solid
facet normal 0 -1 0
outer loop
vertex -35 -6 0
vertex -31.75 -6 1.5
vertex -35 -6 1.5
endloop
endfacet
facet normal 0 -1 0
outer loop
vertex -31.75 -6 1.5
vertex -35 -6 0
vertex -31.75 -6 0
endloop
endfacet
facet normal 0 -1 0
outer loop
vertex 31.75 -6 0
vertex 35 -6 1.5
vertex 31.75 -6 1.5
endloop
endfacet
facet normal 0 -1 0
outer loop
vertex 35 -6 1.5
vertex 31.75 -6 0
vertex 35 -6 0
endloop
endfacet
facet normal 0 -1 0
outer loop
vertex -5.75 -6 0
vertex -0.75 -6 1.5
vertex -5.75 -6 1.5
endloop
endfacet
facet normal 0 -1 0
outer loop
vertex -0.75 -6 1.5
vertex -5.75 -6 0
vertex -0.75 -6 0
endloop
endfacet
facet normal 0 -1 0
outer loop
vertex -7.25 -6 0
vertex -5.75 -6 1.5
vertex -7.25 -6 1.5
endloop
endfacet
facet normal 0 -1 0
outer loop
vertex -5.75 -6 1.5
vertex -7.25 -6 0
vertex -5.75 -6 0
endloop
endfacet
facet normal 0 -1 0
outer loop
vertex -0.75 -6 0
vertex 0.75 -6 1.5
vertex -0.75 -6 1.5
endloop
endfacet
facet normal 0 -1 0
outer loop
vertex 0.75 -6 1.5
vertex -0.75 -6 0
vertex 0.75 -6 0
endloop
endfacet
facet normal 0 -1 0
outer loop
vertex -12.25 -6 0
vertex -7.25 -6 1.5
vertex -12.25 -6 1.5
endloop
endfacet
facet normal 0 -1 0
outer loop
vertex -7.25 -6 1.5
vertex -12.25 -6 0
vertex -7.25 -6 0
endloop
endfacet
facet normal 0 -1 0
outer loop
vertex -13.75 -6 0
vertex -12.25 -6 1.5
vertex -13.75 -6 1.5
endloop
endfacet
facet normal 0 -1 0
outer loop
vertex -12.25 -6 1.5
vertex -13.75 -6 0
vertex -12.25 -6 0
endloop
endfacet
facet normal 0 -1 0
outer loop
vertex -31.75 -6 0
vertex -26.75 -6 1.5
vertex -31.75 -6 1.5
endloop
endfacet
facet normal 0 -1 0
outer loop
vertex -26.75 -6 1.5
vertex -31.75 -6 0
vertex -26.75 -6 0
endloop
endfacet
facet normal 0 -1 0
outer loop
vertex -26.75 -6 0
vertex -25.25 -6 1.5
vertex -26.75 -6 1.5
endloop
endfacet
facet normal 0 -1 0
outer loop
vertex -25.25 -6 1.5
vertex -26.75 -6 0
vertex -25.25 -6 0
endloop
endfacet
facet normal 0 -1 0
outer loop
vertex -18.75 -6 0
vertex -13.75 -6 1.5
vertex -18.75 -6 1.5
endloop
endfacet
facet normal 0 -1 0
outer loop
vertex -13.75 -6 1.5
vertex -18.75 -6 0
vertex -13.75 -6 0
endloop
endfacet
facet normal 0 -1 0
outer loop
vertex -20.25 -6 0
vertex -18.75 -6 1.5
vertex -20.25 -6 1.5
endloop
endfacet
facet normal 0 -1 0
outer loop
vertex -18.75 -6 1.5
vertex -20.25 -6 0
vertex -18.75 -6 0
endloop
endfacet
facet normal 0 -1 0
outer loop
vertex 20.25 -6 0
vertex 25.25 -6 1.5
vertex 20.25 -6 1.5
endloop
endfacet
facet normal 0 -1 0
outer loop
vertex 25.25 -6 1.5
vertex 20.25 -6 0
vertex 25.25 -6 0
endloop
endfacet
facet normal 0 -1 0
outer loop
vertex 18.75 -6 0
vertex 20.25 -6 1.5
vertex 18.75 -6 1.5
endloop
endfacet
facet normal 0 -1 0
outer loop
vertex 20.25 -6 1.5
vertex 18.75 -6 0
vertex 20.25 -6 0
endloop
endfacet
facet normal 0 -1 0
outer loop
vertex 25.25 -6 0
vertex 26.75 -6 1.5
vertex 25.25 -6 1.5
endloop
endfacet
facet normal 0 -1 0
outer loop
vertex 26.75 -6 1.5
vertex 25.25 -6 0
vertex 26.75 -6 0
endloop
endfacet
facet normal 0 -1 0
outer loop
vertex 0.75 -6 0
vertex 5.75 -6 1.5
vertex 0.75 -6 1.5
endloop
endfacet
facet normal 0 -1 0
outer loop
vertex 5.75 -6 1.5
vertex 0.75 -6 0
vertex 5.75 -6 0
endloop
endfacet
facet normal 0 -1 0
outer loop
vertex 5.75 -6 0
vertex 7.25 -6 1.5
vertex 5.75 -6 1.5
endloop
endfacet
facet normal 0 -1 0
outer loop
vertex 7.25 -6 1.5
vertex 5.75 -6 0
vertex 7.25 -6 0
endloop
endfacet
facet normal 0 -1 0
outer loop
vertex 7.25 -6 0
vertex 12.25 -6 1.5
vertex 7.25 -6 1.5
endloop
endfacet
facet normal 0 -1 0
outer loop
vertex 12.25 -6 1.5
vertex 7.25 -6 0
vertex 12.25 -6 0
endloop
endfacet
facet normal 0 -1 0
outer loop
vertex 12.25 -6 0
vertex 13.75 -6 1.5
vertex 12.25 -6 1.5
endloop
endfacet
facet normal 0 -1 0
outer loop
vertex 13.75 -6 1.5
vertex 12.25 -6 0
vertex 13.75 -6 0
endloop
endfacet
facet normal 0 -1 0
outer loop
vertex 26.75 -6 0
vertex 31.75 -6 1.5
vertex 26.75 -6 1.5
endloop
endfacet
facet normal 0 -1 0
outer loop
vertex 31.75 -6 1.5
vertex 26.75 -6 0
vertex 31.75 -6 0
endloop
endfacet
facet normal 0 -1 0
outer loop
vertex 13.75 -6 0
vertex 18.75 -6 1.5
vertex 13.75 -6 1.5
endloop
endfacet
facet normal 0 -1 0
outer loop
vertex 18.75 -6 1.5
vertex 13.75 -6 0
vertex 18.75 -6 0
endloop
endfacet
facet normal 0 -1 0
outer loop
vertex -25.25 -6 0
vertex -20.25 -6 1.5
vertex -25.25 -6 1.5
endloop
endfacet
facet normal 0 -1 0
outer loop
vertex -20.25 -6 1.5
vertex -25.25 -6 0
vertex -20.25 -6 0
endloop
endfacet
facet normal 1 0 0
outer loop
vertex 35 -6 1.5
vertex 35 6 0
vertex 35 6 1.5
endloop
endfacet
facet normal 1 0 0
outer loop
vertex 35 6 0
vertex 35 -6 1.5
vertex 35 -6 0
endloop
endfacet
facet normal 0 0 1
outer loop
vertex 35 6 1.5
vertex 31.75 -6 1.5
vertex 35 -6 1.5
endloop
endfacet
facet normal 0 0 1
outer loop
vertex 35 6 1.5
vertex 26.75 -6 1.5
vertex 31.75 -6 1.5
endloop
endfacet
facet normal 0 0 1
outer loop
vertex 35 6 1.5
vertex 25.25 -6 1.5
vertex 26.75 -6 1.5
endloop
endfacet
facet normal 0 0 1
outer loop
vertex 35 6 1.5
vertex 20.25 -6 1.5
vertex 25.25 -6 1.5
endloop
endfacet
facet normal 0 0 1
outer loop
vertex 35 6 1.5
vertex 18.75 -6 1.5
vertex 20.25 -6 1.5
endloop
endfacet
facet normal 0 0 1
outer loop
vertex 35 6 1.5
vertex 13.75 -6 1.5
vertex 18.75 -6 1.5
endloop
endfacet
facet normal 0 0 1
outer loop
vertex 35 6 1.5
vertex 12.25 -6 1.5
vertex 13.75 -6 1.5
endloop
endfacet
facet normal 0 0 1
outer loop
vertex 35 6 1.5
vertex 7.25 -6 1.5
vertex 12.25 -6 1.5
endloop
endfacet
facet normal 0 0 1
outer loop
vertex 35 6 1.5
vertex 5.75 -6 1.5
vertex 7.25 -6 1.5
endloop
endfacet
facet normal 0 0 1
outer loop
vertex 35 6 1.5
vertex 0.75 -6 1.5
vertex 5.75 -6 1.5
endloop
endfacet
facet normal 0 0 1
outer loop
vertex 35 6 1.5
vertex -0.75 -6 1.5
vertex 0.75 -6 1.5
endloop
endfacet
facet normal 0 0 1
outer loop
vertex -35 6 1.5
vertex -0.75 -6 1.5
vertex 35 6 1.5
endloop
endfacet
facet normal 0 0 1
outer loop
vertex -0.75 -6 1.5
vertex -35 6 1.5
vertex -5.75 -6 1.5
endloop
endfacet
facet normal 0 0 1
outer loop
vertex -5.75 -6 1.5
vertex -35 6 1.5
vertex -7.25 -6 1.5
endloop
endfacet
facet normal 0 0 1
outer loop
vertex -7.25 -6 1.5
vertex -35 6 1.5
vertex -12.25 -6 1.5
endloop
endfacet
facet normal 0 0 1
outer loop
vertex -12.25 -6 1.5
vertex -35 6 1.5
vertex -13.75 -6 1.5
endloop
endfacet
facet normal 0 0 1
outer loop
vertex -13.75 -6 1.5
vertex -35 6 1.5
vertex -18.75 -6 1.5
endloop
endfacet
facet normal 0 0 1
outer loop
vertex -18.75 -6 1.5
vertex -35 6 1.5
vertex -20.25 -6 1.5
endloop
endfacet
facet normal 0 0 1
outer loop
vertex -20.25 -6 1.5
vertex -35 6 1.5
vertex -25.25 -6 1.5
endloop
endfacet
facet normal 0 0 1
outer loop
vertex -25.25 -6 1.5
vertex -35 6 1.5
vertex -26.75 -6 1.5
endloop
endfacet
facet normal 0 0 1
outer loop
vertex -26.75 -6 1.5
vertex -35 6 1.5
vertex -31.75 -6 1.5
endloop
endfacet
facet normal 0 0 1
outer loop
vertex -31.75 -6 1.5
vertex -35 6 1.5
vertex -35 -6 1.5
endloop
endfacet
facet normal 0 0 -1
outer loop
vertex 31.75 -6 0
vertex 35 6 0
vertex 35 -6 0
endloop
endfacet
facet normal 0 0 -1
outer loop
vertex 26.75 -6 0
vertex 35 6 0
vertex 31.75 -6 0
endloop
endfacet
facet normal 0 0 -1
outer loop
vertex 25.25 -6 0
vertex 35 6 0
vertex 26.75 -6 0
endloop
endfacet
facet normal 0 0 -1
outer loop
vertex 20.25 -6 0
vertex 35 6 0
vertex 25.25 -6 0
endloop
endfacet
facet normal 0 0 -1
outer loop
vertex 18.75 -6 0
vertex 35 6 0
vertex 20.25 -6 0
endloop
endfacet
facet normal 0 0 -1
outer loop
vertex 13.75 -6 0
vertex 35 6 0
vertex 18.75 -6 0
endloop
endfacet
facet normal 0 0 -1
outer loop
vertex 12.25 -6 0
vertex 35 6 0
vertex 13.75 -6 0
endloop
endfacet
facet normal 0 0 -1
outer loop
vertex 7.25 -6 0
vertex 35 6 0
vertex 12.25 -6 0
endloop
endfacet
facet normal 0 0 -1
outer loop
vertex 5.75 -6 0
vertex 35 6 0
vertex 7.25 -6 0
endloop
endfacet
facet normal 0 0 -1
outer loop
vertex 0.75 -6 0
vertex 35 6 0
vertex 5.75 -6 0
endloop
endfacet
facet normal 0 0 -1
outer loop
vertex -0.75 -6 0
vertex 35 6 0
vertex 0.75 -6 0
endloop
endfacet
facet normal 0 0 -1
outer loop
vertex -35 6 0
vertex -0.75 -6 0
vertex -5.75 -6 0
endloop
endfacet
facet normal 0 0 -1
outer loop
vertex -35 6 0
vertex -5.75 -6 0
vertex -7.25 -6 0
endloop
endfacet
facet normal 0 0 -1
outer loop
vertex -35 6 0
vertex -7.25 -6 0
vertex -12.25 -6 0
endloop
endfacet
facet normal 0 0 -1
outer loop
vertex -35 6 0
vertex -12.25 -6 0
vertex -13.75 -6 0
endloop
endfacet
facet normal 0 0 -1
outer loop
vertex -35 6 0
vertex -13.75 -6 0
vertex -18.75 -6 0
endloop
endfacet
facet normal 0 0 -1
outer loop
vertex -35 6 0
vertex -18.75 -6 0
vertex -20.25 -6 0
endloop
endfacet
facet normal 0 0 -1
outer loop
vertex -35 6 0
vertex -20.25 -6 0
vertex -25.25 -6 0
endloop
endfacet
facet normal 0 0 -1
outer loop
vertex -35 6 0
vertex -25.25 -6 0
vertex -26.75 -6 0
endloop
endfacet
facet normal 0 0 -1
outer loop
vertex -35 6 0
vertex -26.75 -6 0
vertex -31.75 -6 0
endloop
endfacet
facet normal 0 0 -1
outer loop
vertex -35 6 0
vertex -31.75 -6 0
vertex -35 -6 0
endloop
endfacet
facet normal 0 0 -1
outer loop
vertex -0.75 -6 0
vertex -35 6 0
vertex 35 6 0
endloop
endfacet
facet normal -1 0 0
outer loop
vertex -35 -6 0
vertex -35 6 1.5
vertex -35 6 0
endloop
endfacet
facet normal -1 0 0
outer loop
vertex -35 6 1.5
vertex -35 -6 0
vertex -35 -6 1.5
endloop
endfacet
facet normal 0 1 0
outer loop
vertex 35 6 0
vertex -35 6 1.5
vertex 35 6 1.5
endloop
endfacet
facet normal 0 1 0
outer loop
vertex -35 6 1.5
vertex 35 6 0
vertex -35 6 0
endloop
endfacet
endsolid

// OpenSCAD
// 10-well comb for agarose gel casting, printed lying flat
// Units: mm

$fn = 64;

// Spine (back bar)
spine_len   = 70;   // length along X
spine_wid   = 12;   // width along Y

// Teeth
tooth_count = 10;   // number of teeth
tooth_w     = 5.0;  // tooth width along X
tooth_l     = 12;   // tooth length along Y (hanging from spine)

// Plate
plate_t     = 1.5;  // plate thickness along Z

// Gaps
gap         = 1.5;  // spacing between neighbouring teeth along X

// Derived
pitch       = tooth_w + gap;  // centre-to-centre spacing along X
overhang    = tooth_l + 0.5;  // tooth length + cut clearance

difference() {
    // Base plate
    translate([-spine_len/2, -spine_wid/2, 0])
        cube([spine_len, spine_wid, plate_t]);

    // Teeth row, centred on spine in X
    for (i = [0 : tooth_count - 1]) {
        x = (i - (tooth_count - 1)/2) * pitch;
        translate([x - tooth_w/2, -spine_wid/2 - overhang, 0])
            cube([tooth_w, tooth_l + 0.5, plate_t]);
    }
}
